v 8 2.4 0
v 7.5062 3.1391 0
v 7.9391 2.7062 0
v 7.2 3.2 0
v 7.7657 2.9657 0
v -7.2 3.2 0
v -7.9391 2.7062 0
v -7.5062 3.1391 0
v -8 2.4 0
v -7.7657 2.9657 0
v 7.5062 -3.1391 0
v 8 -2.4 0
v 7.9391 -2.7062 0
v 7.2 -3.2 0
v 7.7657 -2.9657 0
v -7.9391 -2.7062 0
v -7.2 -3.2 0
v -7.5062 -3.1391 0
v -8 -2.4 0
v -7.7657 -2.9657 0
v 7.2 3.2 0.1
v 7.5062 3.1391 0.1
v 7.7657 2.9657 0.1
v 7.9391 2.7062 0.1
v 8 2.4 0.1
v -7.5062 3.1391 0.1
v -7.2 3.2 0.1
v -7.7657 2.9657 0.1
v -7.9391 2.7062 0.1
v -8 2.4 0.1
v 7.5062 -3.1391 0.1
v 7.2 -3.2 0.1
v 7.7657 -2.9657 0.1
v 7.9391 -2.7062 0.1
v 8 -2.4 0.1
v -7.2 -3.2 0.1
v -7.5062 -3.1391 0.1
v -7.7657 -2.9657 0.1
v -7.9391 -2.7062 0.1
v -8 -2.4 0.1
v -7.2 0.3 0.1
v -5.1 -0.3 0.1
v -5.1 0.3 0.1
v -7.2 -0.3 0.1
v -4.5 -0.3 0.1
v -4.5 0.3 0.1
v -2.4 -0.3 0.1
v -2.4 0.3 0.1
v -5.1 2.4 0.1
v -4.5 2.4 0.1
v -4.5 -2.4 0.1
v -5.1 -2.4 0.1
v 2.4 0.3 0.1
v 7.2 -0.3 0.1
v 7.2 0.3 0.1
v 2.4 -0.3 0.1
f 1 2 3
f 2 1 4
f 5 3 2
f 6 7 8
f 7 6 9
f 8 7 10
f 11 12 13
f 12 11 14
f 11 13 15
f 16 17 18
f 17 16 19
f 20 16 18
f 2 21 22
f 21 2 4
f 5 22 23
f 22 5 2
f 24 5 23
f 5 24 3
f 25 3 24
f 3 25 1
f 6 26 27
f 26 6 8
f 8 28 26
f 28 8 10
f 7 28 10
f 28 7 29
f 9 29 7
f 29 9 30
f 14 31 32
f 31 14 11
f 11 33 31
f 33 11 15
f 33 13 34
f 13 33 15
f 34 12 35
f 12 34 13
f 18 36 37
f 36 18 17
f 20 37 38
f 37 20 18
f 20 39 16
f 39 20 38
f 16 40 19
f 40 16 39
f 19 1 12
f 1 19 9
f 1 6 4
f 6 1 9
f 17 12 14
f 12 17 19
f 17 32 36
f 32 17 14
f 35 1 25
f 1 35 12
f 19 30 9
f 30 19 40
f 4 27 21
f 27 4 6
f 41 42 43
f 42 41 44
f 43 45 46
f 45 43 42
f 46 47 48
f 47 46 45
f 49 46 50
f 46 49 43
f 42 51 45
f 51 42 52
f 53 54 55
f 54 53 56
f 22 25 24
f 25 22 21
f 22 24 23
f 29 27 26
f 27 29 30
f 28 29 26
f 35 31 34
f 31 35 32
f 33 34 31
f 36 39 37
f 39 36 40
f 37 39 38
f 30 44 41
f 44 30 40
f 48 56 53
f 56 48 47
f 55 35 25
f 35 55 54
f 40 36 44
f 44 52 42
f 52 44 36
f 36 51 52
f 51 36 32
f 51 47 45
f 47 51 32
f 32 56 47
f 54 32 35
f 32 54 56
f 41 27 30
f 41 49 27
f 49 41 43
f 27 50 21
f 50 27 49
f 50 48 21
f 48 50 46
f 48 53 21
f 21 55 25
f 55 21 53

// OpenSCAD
// file: ../p/1-4cyli.scad
use <../lib.scad>
function ldraw_lib__1_4cyli() = [
// 0 Cylinder 0.25
// 0 Name: 1-4cyli.dat
// 0 Author: James Jessiman
// 0 !LDRAW_ORG Primitive UPDATE 2012-01
// 0 !LICENSE Licensed under CC BY 2.0 and CC BY 4.0 : see CAreadme.txt
// 
// 0 BFC CERTIFY CCW
  [0,"BFC","CERTIFY"],
  [0,"BFC","CCW"],
// 
// 0 !HISTORY 2002-03-23 [sbliss] Added BFC statement.
// 0 !HISTORY 2002-04-25 [PTadmin] Official Update 2002-02
// 0 !HISTORY 2007-06-22 [PTadmin] Header formatted for Contributor Agreement
// 0 !HISTORY 2008-07-01 [PTadmin] Official Update 2008-01
// 0 !HISTORY 2012-02-16 [Philo] Changed to CCW
// 0 !HISTORY 2012-03-30 [PTadmin] Official Update 2012-01
// 
// 
// 4 16 1 1 0 0.9239 1 0.3827 0.9239 0 0.3827 1 0 0
  [4,16,1,1,0,0.9239,1,0.3827,0.9239,0,0.3827,1,0,0],
// 5 24 1 0 0 1 1 0 0.9239 0 0.3827 1 0 -1
  [5,24,1,0,0,1,1,0,0.9239,0,0.3827,1,0,-1],
// 4 16 0.9239 1 0.3827 0.7071 1 0.7071 0.7071 0 0.7071 0.9239 0 0.3827
  [4,16,0.9239,1,0.3827,0.7071,1,0.7071,0.7071,0,0.7071,0.9239,0,0.3827],
// 5 24 0.9239 0 0.3827 0.9239 1 0.3827 0.7071 0 0.7071 1 0 0
  [5,24,0.9239,0,0.3827,0.9239,1,0.3827,0.7071,0,0.7071,1,0,0],
// 4 16 0.7071 1 0.7071 0.3827 1 0.9239 0.3827 0 0.9239 0.7071 0 0.7071
  [4,16,0.7071,1,0.7071,0.3827,1,0.9239,0.3827,0,0.9239,0.7071,0,0.7071],
// 5 24 0.7071 0 0.7071 0.7071 1 0.7071 0.3827 0 0.9239 0.9239 0 0.3827
  [5,24,0.7071,0,0.7071,0.7071,1,0.7071,0.3827,0,0.9239,0.9239,0,0.3827],
// 4 16 0.3827 1 0.9239 0 1 1 0 0 1 0.3827 0 0.9239
  [4,16,0.3827,1,0.9239,0,1,1,0,0,1,0.3827,0,0.9239],
// 5 24 0.3827 0 0.9239 0.3827 1 0.9239 0 0 1 0.7071 0 0.7071
  [5,24,0.3827,0,0.9239,0.3827,1,0.9239,0,0,1,0.7071,0,0.7071],
// 5 24 0 0 1 0 1 1 0.3827 0 0.9239 -1 0 1
  [5,24,0,0,1,0,1,1,0.3827,0,0.9239,-1,0,1],
];
module ldraw_lib__1_4cyli(step=0, col=false, unit=2/5, alt=false, line=0.2, solid=!$preview)
    makepoly(ldraw_lib__1_4cyli(), step=step, col=col, unit=unit, alt=alt, line=line, solid=solid);
ldraw_lib__1_4cyli(line=0.2);
// file: ../p/1-4chrd.scad
use <../lib.scad>
function ldraw_lib__1_4chrd() = [
// 0 Chord 0.25
// 0 Name: 1-4chrd.dat
// 0 Author: Tony Hafner [hafhead]
// 0 !LDRAW_ORG Primitive UPDATE 2012-02
// 0 !LICENSE Licensed under CC BY 2.0 and CC BY 4.0 : see CAreadme.txt
// 
// 0 BFC CERTIFY CCW
  [0,"BFC","CERTIFY"],
  [0,"BFC","CCW"],
// 
// 0 !HISTORY 2004-04-22 [PTadmin] Official Update 2004-02
// 0 !HISTORY 2007-10-09 [PTadmin] Header formatted for Contributor Agreement
// 0 !HISTORY 2008-07-01 [PTadmin] Official Update 2008-01
// 0 !HISTORY 2012-08-02 [MMR1988] Re-creation with PrimGen2 and Rectifier
// 0 !HISTORY 2012-08-09 [PTadmin] Official Update 2012-02
// 
// 
// 4 16 0.9239 0 0.3827 0.3827 0 0.9239 0 0 1 1 0 0
  [4,16,0.9239,0,0.3827,0.3827,0,0.9239,0,0,1,1,0,0],
// 3 16 0.7071 0 0.7071 0.3827 0 0.9239 0.9239 0 0.3827
  [3,16,0.7071,0,0.7071,0.3827,0,0.9239,0.9239,0,0.3827],
];
module ldraw_lib__1_4chrd(step=0, col=false, unit=2/5, alt=false, line=0.2, solid=!$preview)
    makepoly(ldraw_lib__1_4chrd(), step=step, col=col, unit=unit, alt=alt, line=line, solid=solid);
ldraw_lib__1_4chrd(line=0.2);
// main file
use <../lib.scad>
use <../p/1-4chrd.scad>
use <../p/1-4cyli.scad>
function ldraw_lib__6283148y() = [
// 0 Sticker  0.8 x  2.0 with Plus and Minus Symbols on Dark Bluish Grey
// 0 Name: 6283148y.dat
// 0 Author: Chris Dee [cwdee]
// 0 !LDRAW_ORG Part UPDATE 2022-02
// 0 !LICENSE Licensed under CC BY 2.0 and CC BY 4.0 : see CAreadme.txt
// 
// 0 BFC CERTIFY CCW
  [0,"BFC","CERTIFY"],
  [0,"BFC","CCW"],
// 
// 0 !KEYWORDS Defender, Land Rover, Set 42110
// 
// 0 !HISTORY 2022-03-06 [PTadmin] Official Update 2022-02
// 
// 
// 1 16 18 0 6 0 0 2 0 -1 0 2 0 0 1-4chrd.dat
  [1,16,18,0,6,0,0,2,0,-1,0,2,0,0, ldraw_lib__1_4chrd()],
// 1 16 -18 0 6 0 0 -2 0 -1 0 2 0 0 1-4chrd.dat
  [1,16,-18,0,6,0,0,-2,0,-1,0,2,0,0, ldraw_lib__1_4chrd()],
// 1 16 18 0 -6 0 0 2 0 -1 0 -2 0 0 1-4chrd.dat
  [1,16,18,0,-6,0,0,2,0,-1,0,-2,0,0, ldraw_lib__1_4chrd()],
// 1 16 -18 0 -6 0 0 -2 0 -1 0 -2 0 0 1-4chrd.dat
  [1,16,-18,0,-6,0,0,-2,0,-1,0,-2,0,0, ldraw_lib__1_4chrd()],
// 
// 1 16 18 0 6 0 0 2 0 -0.25 0 2 0 0 1-4cyli.dat
  [1,16,18,0,6,0,0,2,0,-0.25,0,2,0,0, ldraw_lib__1_4cyli()],
// 1 16 -18 0 6 0 0 -2 0 -0.25 0 2 0 0 1-4cyli.dat
  [1,16,-18,0,6,0,0,-2,0,-0.25,0,2,0,0, ldraw_lib__1_4cyli()],
// 1 16 18 0 -6 0 0 2 0 -0.25 0 -2 0 0 1-4cyli.dat
  [1,16,18,0,-6,0,0,2,0,-0.25,0,-2,0,0, ldraw_lib__1_4cyli()],
// 1 16 -18 0 -6 0 0 -2 0 -0.25 0 -2 0 0 1-4cyli.dat
  [1,16,-18,0,-6,0,0,-2,0,-0.25,0,-2,0,0, ldraw_lib__1_4cyli()],
// 
// 4 16 -20 0 -6 -20 0 6 20 0 6 20 0 -6
  [4,16,-20,0,-6,-20,0,6,20,0,6,20,0,-6],
// 4 16 -20 0 6 -18 0 8 18 0 8 20 0 6
  [4,16,-20,0,6,-18,0,8,18,0,8,20,0,6],
// 4 16 18 0 -8 -18 0 -8 -20 0 -6 20 0 -6
  [4,16,18,0,-8,-18,0,-8,-20,0,-6,20,0,-6],
// 4 16 -18 -0.25 -8 -18 0 -8 18 0 -8 18 -0.25 -8
  [4,16,-18,-0.25,-8,-18,0,-8,18,0,-8,18,-0.25,-8],
// 4 16 20 -0.25 6 20 -0.25 -6 20 0 -6 20 0 6
  [4,16,20,-0.25,6,20,-0.25,-6,20,0,-6,20,0,6],
// 4 16 -20 0 -6 -20 -0.25 -6 -20 -0.25 6 -20 0 6
  [4,16,-20,0,-6,-20,-0.25,-6,-20,-0.25,6,-20,0,6],
// 4 16 -18 0 8 -18 -0.25 8 18 -0.25 8 18 0 8
  [4,16,-18,0,8,-18,-0.25,8,18,-0.25,8,18,0,8],
// 0 // Plus
// 4 15 -12.75 -0.25 0.75 -18 -0.25 0.75 -18 -0.25 -0.75 -12.75 -0.25 -0.75
  [4,15,-12.75,-0.25,0.75,-18,-0.25,0.75,-18,-0.25,-0.75,-12.75,-0.25,-0.75],
// 4 15 -11.25 -0.25 0.75 -12.75 -0.25 0.75 -12.75 -0.25 -0.75 -11.25 -0.25 -0.75
  [4,15,-11.25,-0.25,0.75,-12.75,-0.25,0.75,-12.75,-0.25,-0.75,-11.25,-0.25,-0.75],
// 4 15 -6 -0.25 0.75 -11.25 -0.25 0.75 -11.25 -0.25 -0.75 -6 -0.25 -0.75
  [4,15,-6,-0.25,0.75,-11.25,-0.25,0.75,-11.25,-0.25,-0.75,-6,-0.25,-0.75],
// 4 15 -11.25 -0.25 6 -12.75 -0.25 6 -12.75 -0.25 0.75 -11.25 -0.25 0.75
  [4,15,-11.25,-0.25,6,-12.75,-0.25,6,-12.75,-0.25,0.75,-11.25,-0.25,0.75],
// 4 15 -11.25 -0.25 -0.75 -12.75 -0.25 -0.75 -12.75 -0.25 -6 -11.25 -0.25 -6
  [4,15,-11.25,-0.25,-0.75,-12.75,-0.25,-0.75,-12.75,-0.25,-6,-11.25,-0.25,-6],
// 0 // Minus
// 4 15 18 -0.25 0.75 6 -0.25 0.75 6 -0.25 -0.75 18 -0.25 -0.75
  [4,15,18,-0.25,0.75,6,-0.25,0.75,6,-0.25,-0.75,18,-0.25,-0.75],
// 0 // Background
// 1 72 18 -0.25 6 0 0 2 0 1 0 2 0 0 1-4chrd.dat
  [1,72,18,-0.25,6,0,0,2,0,1,0,2,0,0, ldraw_lib__1_4chrd()],
// 1 72 -18 -0.25 6 0 0 -2 0 1 0 2 0 0 1-4chrd.dat
  [1,72,-18,-0.25,6,0,0,-2,0,1,0,2,0,0, ldraw_lib__1_4chrd()],
// 1 72 18 -0.25 -6 0 0 2 0 1 0 -2 0 0 1-4chrd.dat
  [1,72,18,-0.25,-6,0,0,2,0,1,0,-2,0,0, ldraw_lib__1_4chrd()],
// 1 72 -18 -0.25 -6 0 0 -2 0 1 0 -2 0 0 1-4chrd.dat
  [1,72,-18,-0.25,-6,0,0,-2,0,1,0,-2,0,0, ldraw_lib__1_4chrd()],
// 4 72 -20 -0.25 -6 -18 -0.25 -0.75 -18 -0.25 0.75 -20 -0.25 6
  [4,72,-20,-0.25,-6,-18,-0.25,-0.75,-18,-0.25,0.75,-20,-0.25,6],
// 4 72 -6 -0.25 -0.75 6 -0.25 -0.75 6 -0.25 0.75 -6 -0.25 0.75
  [4,72,-6,-0.25,-0.75,6,-0.25,-0.75,6,-0.25,0.75,-6,-0.25,0.75],
// 4 72 20 -0.25 6 18 -0.25 0.75 18 -0.25 -0.75 20 -0.25 -6
  [4,72,20,-0.25,6,18,-0.25,0.75,18,-0.25,-0.75,20,-0.25,-6],
// 3 72 -20 -0.25 -6 -18 -0.25 -8 -18 -0.25 -0.75
  [3,72,-20,-0.25,-6,-18,-0.25,-8,-18,-0.25,-0.75],
// 4 72 -18 -0.25 -8 -12.75 -0.25 -6 -12.75 -0.25 -0.75 -18 -0.25 -0.75
  [4,72,-18,-0.25,-8,-12.75,-0.25,-6,-12.75,-0.25,-0.75,-18,-0.25,-0.75],
// 4 72 18 -0.25 -8 -11.25 -0.25 -6 -12.75 -0.25 -6 -18 -0.25 -8
  [4,72,18,-0.25,-8,-11.25,-0.25,-6,-12.75,-0.25,-6,-18,-0.25,-8],
// 4 72 18 -0.25 -8 -6 -0.25 -0.75 -11.25 -0.25 -0.75 -11.25 -0.25 -6
  [4,72,18,-0.25,-8,-6,-0.25,-0.75,-11.25,-0.25,-0.75,-11.25,-0.25,-6],
// 3 72 18 -0.25 -8 6 -0.25 -0.75 -6 -0.25 -0.75
  [3,72,18,-0.25,-8,6,-0.25,-0.75,-6,-0.25,-0.75],
// 4 72 18 -0.25 -8 20 -0.25 -6 18 -0.25 -0.75 6 -0.25 -0.75
  [4,72,18,-0.25,-8,20,-0.25,-6,18,-0.25,-0.75,6,-0.25,-0.75],
// 3 72 -18 -0.25 0.75 -18 -0.25 8 -20 -0.25 6
  [3,72,-18,-0.25,0.75,-18,-0.25,8,-20,-0.25,6],
// 4 72 -18 -0.25 0.75 -12.75 -0.25 0.75 -12.75 -0.25 6 -18 -0.25 8
  [4,72,-18,-0.25,0.75,-12.75,-0.25,0.75,-12.75,-0.25,6,-18,-0.25,8],
// 4 72 -18 -0.25 8 -12.75 -0.25 6 -11.25 -0.25 6 18 -0.25 8
  [4,72,-18,-0.25,8,-12.75,-0.25,6,-11.25,-0.25,6,18,-0.25,8],
// 4 72 -11.25 -0.25 6 -11.25 -0.25 0.75 -6 -0.25 0.75 18 -0.25 8
  [4,72,-11.25,-0.25,6,-11.25,-0.25,0.75,-6,-0.25,0.75,18,-0.25,8],
// 3 72 -6 -0.25 0.75 6 -0.25 0.75 18 -0.25 8
  [3,72,-6,-0.25,0.75,6,-0.25,0.75,18,-0.25,8],
// 4 72 6 -0.25 0.75 18 -0.25 0.75 20 -0.25 6 18 -0.25 8
  [4,72,6,-0.25,0.75,18,-0.25,0.75,20,-0.25,6,18,-0.25,8],
];
module ldraw_lib__6283148y(step=0, col=false, unit=2/5, alt=false, line=0.2, solid=!$preview)
    makepoly(ldraw_lib__6283148y(), step=step, col=col, unit=unit, alt=alt, line=line, solid=solid);
ldraw_lib__6283148y(line=0.2);
